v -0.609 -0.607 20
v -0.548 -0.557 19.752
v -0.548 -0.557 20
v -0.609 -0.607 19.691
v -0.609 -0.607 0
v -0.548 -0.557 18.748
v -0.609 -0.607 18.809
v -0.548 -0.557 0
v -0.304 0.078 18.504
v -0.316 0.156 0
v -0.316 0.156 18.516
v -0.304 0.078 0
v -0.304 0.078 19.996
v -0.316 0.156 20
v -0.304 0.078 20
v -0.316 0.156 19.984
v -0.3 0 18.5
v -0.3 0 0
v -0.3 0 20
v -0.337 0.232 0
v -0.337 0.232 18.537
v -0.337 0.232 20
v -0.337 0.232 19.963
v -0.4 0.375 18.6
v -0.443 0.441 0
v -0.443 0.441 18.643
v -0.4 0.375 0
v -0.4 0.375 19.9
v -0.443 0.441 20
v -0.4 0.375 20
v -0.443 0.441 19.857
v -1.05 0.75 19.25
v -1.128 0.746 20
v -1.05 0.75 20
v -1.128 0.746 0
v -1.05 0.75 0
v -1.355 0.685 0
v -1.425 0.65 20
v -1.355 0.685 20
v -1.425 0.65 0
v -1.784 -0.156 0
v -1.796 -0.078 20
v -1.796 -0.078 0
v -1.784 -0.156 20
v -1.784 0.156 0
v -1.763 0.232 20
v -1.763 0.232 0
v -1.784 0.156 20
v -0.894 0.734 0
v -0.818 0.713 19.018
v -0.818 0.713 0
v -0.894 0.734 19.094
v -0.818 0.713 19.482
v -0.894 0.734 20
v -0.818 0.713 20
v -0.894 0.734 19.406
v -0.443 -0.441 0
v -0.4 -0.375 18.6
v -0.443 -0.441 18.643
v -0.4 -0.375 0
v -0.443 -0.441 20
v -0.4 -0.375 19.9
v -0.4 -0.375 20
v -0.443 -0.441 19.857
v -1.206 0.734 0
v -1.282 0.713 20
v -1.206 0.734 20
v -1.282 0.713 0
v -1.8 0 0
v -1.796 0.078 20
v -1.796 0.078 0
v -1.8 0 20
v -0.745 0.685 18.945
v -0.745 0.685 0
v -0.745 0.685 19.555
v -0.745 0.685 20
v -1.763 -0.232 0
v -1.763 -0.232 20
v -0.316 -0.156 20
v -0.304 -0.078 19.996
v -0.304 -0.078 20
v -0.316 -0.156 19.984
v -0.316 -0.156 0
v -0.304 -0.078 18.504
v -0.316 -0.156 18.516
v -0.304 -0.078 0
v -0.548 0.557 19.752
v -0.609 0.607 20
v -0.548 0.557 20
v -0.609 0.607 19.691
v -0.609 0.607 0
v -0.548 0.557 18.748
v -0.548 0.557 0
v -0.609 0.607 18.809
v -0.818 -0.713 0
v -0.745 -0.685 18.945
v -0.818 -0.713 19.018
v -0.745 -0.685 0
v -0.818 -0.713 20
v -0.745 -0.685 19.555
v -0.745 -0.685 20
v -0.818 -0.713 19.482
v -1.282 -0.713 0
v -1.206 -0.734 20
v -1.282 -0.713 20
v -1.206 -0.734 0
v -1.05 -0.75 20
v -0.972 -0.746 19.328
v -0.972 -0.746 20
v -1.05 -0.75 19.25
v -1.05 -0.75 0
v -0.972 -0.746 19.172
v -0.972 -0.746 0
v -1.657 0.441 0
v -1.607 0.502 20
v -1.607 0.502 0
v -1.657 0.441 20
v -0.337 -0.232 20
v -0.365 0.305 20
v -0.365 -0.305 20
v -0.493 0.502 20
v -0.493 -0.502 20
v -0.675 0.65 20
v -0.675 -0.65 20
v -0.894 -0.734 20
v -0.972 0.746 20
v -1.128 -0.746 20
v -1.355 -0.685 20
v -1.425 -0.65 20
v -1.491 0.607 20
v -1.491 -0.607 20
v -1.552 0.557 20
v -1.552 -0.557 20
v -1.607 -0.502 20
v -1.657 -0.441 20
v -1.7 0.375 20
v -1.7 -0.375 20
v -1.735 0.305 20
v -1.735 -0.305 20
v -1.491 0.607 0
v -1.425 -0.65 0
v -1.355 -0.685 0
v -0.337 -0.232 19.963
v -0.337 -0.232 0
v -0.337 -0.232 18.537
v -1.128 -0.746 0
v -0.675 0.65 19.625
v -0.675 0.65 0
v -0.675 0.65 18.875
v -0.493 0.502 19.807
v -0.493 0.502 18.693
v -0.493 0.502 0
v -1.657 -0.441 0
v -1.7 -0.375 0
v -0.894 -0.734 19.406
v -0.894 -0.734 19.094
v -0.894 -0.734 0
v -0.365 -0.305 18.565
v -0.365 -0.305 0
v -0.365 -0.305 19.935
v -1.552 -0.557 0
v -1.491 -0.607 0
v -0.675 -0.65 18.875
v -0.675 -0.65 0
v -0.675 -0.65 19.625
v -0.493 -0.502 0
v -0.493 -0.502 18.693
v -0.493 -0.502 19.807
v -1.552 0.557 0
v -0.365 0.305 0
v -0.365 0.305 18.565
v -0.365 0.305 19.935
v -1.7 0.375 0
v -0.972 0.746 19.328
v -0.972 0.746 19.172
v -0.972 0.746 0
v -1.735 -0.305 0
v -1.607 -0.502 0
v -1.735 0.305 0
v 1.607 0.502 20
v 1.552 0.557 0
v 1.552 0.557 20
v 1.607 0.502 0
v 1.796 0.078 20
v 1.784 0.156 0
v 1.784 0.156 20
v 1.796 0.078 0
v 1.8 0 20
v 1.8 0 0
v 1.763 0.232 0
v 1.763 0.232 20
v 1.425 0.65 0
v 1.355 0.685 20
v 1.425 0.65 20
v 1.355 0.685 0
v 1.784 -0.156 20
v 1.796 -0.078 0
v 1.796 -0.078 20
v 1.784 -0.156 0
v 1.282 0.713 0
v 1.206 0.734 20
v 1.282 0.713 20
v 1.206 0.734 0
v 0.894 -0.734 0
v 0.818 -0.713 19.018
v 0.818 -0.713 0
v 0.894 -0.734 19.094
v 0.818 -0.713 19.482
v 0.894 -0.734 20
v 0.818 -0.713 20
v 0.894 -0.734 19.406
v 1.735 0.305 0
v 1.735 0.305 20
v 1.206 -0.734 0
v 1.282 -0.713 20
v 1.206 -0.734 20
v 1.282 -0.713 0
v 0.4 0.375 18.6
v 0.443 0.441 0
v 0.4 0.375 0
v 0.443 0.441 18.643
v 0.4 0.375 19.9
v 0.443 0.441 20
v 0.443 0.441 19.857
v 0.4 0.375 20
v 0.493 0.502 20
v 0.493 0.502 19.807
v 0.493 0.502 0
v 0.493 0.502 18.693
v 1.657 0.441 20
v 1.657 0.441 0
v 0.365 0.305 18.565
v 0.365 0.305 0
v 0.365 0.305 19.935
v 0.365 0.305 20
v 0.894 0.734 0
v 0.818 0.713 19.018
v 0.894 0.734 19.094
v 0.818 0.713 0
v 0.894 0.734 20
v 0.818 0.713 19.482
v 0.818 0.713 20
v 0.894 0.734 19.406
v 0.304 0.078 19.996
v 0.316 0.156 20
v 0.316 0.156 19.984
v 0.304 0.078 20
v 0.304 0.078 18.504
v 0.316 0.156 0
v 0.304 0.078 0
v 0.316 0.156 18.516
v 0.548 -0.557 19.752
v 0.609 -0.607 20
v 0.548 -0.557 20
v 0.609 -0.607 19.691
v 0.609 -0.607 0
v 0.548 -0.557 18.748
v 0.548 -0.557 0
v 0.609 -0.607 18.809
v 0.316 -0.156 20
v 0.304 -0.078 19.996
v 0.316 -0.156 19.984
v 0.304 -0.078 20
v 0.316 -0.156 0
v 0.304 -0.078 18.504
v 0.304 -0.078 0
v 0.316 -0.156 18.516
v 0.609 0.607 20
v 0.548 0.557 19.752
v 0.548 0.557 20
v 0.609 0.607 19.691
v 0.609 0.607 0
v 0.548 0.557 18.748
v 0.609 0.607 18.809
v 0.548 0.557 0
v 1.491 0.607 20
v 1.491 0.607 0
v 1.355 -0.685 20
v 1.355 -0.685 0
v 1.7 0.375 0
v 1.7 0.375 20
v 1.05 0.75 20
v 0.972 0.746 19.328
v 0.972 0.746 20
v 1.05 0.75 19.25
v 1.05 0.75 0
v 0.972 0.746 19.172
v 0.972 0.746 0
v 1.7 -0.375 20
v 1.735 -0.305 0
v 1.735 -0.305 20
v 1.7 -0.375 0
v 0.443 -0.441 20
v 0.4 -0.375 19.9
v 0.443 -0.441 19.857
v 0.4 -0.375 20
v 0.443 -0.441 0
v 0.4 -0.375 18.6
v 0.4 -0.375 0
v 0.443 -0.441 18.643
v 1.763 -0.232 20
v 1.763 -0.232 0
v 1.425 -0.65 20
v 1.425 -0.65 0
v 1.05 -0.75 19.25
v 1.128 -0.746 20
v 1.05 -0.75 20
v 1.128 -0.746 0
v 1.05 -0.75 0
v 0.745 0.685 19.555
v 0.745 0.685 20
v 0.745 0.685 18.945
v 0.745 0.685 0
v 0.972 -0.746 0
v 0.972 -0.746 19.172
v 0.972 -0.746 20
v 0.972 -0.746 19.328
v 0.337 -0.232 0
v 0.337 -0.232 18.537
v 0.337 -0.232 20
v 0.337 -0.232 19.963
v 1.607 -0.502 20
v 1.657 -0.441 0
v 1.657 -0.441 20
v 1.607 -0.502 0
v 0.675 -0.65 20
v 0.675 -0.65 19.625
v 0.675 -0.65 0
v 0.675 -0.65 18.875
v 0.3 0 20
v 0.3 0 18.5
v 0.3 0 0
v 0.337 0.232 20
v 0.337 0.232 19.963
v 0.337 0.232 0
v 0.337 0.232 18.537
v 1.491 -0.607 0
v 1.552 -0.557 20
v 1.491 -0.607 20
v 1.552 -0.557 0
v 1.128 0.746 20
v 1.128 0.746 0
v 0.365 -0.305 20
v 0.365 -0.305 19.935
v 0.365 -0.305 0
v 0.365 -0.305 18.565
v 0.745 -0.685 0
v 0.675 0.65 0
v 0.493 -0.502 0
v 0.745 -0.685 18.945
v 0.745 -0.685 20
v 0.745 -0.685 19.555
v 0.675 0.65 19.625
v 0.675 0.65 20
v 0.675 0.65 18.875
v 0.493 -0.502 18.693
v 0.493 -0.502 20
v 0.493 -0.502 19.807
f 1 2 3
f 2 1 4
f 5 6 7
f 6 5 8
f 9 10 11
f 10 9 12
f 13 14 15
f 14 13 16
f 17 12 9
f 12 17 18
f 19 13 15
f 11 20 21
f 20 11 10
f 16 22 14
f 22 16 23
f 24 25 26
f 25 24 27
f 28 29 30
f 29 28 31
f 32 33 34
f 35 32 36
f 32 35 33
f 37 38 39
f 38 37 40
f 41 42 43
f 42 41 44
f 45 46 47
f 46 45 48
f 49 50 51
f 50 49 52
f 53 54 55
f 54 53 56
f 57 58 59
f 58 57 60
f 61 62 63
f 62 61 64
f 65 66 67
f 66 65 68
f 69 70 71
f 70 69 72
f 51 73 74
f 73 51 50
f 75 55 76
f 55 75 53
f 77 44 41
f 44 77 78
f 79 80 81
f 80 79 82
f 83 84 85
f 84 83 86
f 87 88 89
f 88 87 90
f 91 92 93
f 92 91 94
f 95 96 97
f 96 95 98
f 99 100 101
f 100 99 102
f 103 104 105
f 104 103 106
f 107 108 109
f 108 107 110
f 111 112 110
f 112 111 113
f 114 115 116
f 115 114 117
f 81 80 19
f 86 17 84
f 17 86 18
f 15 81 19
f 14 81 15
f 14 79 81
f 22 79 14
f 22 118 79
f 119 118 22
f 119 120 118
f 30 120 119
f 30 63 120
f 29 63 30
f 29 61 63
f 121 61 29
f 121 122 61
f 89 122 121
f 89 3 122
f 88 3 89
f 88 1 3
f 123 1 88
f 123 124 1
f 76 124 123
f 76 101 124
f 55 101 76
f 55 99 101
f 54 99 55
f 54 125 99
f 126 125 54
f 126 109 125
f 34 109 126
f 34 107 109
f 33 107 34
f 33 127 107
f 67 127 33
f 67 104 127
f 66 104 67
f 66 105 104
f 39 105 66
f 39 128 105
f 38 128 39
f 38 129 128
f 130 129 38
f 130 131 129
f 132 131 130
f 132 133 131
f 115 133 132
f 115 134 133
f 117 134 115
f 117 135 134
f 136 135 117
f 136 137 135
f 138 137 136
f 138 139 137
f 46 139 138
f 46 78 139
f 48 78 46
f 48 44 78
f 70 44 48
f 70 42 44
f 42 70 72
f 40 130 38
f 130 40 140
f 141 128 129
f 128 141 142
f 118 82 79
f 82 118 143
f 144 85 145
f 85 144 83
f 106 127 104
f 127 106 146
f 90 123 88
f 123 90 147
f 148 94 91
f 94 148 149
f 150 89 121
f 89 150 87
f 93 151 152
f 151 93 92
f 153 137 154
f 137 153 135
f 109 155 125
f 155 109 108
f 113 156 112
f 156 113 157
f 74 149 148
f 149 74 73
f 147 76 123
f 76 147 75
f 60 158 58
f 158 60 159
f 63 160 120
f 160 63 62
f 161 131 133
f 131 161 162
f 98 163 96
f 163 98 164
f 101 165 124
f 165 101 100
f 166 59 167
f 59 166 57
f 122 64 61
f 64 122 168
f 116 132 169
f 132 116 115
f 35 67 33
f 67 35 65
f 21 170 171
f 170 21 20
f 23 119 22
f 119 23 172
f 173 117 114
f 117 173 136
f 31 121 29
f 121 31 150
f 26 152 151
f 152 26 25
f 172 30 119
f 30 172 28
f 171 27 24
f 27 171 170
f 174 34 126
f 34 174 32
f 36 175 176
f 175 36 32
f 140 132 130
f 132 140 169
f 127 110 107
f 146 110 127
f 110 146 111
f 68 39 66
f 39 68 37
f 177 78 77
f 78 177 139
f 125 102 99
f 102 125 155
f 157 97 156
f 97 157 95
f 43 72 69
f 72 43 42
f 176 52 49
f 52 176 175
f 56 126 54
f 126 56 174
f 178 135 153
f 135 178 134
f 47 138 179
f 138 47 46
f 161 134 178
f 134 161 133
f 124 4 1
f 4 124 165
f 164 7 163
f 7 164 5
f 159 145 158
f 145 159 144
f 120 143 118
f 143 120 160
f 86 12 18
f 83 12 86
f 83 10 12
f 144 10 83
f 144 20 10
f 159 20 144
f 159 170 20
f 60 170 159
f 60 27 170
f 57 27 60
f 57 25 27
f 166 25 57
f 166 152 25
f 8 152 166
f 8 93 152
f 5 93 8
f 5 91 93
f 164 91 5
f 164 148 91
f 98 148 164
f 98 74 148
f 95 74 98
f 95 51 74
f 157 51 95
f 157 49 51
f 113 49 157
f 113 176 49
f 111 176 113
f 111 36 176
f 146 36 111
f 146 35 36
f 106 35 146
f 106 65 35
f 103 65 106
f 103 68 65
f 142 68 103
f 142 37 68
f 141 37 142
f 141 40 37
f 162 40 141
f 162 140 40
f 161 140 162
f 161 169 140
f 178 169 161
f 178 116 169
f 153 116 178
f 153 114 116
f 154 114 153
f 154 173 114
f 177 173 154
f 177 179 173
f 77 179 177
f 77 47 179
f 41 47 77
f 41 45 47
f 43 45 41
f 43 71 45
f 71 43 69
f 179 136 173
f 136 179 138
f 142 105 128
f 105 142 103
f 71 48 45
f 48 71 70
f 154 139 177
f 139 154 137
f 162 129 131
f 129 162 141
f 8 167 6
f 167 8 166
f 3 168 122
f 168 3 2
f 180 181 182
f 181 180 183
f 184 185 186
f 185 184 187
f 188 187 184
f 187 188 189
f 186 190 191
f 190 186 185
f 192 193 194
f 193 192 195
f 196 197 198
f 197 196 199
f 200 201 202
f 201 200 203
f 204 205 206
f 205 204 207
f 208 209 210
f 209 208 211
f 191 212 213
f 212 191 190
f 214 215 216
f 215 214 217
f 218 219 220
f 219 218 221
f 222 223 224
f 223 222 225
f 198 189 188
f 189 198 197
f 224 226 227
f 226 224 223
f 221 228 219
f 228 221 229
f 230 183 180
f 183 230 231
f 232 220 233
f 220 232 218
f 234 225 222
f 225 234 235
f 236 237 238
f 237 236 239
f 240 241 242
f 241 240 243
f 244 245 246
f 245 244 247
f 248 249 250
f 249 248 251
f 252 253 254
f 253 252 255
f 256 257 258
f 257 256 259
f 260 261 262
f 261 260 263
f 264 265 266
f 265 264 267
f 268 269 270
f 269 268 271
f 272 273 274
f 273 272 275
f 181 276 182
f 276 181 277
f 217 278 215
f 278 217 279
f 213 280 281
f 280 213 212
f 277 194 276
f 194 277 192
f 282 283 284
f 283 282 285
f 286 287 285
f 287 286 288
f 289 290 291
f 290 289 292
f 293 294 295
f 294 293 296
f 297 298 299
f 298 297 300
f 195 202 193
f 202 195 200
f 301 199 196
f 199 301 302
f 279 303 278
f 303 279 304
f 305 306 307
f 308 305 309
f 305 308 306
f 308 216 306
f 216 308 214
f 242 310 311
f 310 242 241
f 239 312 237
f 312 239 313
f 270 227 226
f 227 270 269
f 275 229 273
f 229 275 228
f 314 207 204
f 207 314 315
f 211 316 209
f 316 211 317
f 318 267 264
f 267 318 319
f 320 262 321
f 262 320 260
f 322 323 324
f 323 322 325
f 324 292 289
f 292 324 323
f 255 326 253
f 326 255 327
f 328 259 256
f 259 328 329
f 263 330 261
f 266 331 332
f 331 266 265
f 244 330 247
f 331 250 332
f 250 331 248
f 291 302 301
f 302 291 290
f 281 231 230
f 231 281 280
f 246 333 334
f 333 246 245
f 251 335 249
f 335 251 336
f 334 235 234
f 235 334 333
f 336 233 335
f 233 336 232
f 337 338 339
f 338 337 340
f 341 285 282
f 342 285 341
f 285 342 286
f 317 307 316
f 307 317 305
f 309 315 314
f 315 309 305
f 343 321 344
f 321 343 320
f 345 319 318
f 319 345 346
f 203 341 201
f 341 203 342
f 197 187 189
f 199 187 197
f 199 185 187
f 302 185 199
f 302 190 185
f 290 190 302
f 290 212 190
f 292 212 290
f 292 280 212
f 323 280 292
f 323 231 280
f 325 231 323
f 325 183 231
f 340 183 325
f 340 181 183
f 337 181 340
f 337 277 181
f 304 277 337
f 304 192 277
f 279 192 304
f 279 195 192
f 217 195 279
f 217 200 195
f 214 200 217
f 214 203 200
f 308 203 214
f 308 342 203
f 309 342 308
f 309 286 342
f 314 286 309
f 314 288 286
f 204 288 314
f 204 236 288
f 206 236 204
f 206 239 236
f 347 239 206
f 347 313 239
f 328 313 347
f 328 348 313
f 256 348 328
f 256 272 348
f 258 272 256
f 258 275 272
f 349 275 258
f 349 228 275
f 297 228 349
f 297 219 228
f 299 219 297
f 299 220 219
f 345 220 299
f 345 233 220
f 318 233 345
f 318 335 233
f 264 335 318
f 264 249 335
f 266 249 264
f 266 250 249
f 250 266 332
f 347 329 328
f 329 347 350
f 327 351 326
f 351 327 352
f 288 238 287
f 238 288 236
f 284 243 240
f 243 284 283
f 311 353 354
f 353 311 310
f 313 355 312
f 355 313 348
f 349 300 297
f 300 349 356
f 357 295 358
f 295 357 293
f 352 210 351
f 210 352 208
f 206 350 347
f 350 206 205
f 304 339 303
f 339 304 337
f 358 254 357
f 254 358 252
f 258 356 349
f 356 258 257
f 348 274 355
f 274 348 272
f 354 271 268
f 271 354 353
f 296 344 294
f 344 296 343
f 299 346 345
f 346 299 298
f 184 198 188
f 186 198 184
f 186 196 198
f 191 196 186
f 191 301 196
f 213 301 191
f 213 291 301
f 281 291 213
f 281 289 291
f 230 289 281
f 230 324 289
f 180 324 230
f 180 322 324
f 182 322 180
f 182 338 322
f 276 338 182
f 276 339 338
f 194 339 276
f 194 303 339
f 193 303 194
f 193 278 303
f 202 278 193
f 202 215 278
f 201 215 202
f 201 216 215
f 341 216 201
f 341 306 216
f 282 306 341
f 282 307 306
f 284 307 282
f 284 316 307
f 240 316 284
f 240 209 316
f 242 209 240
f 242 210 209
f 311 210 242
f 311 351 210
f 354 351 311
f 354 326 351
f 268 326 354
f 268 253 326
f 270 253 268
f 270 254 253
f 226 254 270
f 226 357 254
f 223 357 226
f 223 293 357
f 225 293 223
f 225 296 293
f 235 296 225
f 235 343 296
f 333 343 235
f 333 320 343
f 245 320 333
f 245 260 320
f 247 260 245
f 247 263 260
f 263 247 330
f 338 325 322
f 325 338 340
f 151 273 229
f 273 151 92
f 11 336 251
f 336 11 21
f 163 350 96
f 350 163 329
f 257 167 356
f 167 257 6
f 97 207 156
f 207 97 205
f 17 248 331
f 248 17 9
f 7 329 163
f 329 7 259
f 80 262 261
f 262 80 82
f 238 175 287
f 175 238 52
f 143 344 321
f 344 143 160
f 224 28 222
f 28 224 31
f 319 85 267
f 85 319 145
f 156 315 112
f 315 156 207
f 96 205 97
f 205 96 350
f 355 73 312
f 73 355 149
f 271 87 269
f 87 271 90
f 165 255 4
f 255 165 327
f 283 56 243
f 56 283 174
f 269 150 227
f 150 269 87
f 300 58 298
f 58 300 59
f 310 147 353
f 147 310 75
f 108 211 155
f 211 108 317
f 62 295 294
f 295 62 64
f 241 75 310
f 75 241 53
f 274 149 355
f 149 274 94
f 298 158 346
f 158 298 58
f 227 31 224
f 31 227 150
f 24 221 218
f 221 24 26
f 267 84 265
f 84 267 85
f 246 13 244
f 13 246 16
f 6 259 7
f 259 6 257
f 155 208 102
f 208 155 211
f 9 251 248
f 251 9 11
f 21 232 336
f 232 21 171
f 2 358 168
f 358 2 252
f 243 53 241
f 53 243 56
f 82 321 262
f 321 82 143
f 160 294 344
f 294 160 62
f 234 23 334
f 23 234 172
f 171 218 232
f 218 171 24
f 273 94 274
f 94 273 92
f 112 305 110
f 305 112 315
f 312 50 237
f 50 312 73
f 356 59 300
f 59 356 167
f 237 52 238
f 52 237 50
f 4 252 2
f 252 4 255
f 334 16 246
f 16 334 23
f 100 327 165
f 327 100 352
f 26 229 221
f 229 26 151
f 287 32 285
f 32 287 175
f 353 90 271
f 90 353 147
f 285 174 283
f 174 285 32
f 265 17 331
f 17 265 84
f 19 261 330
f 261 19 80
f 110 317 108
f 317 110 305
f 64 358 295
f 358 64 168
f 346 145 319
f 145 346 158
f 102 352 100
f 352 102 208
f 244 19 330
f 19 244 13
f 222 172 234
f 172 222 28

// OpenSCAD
// Two-prong cotter pin.
$fn = 60;
eps = 0.02;
wire_d = 1.5;
length = 20;
prong_gap = wire_d*1.4;
union() {
    translate([-prong_gap/2,0,0]) cylinder(d=wire_d,h=length);
    translate([prong_gap/2,0,0]) cylinder(d=wire_d,h=length);
    translate([-prong_gap/2,0,length-wire_d/2]) rotate([0,90,0]) cylinder(d=wire_d,h=prong_gap);
}
